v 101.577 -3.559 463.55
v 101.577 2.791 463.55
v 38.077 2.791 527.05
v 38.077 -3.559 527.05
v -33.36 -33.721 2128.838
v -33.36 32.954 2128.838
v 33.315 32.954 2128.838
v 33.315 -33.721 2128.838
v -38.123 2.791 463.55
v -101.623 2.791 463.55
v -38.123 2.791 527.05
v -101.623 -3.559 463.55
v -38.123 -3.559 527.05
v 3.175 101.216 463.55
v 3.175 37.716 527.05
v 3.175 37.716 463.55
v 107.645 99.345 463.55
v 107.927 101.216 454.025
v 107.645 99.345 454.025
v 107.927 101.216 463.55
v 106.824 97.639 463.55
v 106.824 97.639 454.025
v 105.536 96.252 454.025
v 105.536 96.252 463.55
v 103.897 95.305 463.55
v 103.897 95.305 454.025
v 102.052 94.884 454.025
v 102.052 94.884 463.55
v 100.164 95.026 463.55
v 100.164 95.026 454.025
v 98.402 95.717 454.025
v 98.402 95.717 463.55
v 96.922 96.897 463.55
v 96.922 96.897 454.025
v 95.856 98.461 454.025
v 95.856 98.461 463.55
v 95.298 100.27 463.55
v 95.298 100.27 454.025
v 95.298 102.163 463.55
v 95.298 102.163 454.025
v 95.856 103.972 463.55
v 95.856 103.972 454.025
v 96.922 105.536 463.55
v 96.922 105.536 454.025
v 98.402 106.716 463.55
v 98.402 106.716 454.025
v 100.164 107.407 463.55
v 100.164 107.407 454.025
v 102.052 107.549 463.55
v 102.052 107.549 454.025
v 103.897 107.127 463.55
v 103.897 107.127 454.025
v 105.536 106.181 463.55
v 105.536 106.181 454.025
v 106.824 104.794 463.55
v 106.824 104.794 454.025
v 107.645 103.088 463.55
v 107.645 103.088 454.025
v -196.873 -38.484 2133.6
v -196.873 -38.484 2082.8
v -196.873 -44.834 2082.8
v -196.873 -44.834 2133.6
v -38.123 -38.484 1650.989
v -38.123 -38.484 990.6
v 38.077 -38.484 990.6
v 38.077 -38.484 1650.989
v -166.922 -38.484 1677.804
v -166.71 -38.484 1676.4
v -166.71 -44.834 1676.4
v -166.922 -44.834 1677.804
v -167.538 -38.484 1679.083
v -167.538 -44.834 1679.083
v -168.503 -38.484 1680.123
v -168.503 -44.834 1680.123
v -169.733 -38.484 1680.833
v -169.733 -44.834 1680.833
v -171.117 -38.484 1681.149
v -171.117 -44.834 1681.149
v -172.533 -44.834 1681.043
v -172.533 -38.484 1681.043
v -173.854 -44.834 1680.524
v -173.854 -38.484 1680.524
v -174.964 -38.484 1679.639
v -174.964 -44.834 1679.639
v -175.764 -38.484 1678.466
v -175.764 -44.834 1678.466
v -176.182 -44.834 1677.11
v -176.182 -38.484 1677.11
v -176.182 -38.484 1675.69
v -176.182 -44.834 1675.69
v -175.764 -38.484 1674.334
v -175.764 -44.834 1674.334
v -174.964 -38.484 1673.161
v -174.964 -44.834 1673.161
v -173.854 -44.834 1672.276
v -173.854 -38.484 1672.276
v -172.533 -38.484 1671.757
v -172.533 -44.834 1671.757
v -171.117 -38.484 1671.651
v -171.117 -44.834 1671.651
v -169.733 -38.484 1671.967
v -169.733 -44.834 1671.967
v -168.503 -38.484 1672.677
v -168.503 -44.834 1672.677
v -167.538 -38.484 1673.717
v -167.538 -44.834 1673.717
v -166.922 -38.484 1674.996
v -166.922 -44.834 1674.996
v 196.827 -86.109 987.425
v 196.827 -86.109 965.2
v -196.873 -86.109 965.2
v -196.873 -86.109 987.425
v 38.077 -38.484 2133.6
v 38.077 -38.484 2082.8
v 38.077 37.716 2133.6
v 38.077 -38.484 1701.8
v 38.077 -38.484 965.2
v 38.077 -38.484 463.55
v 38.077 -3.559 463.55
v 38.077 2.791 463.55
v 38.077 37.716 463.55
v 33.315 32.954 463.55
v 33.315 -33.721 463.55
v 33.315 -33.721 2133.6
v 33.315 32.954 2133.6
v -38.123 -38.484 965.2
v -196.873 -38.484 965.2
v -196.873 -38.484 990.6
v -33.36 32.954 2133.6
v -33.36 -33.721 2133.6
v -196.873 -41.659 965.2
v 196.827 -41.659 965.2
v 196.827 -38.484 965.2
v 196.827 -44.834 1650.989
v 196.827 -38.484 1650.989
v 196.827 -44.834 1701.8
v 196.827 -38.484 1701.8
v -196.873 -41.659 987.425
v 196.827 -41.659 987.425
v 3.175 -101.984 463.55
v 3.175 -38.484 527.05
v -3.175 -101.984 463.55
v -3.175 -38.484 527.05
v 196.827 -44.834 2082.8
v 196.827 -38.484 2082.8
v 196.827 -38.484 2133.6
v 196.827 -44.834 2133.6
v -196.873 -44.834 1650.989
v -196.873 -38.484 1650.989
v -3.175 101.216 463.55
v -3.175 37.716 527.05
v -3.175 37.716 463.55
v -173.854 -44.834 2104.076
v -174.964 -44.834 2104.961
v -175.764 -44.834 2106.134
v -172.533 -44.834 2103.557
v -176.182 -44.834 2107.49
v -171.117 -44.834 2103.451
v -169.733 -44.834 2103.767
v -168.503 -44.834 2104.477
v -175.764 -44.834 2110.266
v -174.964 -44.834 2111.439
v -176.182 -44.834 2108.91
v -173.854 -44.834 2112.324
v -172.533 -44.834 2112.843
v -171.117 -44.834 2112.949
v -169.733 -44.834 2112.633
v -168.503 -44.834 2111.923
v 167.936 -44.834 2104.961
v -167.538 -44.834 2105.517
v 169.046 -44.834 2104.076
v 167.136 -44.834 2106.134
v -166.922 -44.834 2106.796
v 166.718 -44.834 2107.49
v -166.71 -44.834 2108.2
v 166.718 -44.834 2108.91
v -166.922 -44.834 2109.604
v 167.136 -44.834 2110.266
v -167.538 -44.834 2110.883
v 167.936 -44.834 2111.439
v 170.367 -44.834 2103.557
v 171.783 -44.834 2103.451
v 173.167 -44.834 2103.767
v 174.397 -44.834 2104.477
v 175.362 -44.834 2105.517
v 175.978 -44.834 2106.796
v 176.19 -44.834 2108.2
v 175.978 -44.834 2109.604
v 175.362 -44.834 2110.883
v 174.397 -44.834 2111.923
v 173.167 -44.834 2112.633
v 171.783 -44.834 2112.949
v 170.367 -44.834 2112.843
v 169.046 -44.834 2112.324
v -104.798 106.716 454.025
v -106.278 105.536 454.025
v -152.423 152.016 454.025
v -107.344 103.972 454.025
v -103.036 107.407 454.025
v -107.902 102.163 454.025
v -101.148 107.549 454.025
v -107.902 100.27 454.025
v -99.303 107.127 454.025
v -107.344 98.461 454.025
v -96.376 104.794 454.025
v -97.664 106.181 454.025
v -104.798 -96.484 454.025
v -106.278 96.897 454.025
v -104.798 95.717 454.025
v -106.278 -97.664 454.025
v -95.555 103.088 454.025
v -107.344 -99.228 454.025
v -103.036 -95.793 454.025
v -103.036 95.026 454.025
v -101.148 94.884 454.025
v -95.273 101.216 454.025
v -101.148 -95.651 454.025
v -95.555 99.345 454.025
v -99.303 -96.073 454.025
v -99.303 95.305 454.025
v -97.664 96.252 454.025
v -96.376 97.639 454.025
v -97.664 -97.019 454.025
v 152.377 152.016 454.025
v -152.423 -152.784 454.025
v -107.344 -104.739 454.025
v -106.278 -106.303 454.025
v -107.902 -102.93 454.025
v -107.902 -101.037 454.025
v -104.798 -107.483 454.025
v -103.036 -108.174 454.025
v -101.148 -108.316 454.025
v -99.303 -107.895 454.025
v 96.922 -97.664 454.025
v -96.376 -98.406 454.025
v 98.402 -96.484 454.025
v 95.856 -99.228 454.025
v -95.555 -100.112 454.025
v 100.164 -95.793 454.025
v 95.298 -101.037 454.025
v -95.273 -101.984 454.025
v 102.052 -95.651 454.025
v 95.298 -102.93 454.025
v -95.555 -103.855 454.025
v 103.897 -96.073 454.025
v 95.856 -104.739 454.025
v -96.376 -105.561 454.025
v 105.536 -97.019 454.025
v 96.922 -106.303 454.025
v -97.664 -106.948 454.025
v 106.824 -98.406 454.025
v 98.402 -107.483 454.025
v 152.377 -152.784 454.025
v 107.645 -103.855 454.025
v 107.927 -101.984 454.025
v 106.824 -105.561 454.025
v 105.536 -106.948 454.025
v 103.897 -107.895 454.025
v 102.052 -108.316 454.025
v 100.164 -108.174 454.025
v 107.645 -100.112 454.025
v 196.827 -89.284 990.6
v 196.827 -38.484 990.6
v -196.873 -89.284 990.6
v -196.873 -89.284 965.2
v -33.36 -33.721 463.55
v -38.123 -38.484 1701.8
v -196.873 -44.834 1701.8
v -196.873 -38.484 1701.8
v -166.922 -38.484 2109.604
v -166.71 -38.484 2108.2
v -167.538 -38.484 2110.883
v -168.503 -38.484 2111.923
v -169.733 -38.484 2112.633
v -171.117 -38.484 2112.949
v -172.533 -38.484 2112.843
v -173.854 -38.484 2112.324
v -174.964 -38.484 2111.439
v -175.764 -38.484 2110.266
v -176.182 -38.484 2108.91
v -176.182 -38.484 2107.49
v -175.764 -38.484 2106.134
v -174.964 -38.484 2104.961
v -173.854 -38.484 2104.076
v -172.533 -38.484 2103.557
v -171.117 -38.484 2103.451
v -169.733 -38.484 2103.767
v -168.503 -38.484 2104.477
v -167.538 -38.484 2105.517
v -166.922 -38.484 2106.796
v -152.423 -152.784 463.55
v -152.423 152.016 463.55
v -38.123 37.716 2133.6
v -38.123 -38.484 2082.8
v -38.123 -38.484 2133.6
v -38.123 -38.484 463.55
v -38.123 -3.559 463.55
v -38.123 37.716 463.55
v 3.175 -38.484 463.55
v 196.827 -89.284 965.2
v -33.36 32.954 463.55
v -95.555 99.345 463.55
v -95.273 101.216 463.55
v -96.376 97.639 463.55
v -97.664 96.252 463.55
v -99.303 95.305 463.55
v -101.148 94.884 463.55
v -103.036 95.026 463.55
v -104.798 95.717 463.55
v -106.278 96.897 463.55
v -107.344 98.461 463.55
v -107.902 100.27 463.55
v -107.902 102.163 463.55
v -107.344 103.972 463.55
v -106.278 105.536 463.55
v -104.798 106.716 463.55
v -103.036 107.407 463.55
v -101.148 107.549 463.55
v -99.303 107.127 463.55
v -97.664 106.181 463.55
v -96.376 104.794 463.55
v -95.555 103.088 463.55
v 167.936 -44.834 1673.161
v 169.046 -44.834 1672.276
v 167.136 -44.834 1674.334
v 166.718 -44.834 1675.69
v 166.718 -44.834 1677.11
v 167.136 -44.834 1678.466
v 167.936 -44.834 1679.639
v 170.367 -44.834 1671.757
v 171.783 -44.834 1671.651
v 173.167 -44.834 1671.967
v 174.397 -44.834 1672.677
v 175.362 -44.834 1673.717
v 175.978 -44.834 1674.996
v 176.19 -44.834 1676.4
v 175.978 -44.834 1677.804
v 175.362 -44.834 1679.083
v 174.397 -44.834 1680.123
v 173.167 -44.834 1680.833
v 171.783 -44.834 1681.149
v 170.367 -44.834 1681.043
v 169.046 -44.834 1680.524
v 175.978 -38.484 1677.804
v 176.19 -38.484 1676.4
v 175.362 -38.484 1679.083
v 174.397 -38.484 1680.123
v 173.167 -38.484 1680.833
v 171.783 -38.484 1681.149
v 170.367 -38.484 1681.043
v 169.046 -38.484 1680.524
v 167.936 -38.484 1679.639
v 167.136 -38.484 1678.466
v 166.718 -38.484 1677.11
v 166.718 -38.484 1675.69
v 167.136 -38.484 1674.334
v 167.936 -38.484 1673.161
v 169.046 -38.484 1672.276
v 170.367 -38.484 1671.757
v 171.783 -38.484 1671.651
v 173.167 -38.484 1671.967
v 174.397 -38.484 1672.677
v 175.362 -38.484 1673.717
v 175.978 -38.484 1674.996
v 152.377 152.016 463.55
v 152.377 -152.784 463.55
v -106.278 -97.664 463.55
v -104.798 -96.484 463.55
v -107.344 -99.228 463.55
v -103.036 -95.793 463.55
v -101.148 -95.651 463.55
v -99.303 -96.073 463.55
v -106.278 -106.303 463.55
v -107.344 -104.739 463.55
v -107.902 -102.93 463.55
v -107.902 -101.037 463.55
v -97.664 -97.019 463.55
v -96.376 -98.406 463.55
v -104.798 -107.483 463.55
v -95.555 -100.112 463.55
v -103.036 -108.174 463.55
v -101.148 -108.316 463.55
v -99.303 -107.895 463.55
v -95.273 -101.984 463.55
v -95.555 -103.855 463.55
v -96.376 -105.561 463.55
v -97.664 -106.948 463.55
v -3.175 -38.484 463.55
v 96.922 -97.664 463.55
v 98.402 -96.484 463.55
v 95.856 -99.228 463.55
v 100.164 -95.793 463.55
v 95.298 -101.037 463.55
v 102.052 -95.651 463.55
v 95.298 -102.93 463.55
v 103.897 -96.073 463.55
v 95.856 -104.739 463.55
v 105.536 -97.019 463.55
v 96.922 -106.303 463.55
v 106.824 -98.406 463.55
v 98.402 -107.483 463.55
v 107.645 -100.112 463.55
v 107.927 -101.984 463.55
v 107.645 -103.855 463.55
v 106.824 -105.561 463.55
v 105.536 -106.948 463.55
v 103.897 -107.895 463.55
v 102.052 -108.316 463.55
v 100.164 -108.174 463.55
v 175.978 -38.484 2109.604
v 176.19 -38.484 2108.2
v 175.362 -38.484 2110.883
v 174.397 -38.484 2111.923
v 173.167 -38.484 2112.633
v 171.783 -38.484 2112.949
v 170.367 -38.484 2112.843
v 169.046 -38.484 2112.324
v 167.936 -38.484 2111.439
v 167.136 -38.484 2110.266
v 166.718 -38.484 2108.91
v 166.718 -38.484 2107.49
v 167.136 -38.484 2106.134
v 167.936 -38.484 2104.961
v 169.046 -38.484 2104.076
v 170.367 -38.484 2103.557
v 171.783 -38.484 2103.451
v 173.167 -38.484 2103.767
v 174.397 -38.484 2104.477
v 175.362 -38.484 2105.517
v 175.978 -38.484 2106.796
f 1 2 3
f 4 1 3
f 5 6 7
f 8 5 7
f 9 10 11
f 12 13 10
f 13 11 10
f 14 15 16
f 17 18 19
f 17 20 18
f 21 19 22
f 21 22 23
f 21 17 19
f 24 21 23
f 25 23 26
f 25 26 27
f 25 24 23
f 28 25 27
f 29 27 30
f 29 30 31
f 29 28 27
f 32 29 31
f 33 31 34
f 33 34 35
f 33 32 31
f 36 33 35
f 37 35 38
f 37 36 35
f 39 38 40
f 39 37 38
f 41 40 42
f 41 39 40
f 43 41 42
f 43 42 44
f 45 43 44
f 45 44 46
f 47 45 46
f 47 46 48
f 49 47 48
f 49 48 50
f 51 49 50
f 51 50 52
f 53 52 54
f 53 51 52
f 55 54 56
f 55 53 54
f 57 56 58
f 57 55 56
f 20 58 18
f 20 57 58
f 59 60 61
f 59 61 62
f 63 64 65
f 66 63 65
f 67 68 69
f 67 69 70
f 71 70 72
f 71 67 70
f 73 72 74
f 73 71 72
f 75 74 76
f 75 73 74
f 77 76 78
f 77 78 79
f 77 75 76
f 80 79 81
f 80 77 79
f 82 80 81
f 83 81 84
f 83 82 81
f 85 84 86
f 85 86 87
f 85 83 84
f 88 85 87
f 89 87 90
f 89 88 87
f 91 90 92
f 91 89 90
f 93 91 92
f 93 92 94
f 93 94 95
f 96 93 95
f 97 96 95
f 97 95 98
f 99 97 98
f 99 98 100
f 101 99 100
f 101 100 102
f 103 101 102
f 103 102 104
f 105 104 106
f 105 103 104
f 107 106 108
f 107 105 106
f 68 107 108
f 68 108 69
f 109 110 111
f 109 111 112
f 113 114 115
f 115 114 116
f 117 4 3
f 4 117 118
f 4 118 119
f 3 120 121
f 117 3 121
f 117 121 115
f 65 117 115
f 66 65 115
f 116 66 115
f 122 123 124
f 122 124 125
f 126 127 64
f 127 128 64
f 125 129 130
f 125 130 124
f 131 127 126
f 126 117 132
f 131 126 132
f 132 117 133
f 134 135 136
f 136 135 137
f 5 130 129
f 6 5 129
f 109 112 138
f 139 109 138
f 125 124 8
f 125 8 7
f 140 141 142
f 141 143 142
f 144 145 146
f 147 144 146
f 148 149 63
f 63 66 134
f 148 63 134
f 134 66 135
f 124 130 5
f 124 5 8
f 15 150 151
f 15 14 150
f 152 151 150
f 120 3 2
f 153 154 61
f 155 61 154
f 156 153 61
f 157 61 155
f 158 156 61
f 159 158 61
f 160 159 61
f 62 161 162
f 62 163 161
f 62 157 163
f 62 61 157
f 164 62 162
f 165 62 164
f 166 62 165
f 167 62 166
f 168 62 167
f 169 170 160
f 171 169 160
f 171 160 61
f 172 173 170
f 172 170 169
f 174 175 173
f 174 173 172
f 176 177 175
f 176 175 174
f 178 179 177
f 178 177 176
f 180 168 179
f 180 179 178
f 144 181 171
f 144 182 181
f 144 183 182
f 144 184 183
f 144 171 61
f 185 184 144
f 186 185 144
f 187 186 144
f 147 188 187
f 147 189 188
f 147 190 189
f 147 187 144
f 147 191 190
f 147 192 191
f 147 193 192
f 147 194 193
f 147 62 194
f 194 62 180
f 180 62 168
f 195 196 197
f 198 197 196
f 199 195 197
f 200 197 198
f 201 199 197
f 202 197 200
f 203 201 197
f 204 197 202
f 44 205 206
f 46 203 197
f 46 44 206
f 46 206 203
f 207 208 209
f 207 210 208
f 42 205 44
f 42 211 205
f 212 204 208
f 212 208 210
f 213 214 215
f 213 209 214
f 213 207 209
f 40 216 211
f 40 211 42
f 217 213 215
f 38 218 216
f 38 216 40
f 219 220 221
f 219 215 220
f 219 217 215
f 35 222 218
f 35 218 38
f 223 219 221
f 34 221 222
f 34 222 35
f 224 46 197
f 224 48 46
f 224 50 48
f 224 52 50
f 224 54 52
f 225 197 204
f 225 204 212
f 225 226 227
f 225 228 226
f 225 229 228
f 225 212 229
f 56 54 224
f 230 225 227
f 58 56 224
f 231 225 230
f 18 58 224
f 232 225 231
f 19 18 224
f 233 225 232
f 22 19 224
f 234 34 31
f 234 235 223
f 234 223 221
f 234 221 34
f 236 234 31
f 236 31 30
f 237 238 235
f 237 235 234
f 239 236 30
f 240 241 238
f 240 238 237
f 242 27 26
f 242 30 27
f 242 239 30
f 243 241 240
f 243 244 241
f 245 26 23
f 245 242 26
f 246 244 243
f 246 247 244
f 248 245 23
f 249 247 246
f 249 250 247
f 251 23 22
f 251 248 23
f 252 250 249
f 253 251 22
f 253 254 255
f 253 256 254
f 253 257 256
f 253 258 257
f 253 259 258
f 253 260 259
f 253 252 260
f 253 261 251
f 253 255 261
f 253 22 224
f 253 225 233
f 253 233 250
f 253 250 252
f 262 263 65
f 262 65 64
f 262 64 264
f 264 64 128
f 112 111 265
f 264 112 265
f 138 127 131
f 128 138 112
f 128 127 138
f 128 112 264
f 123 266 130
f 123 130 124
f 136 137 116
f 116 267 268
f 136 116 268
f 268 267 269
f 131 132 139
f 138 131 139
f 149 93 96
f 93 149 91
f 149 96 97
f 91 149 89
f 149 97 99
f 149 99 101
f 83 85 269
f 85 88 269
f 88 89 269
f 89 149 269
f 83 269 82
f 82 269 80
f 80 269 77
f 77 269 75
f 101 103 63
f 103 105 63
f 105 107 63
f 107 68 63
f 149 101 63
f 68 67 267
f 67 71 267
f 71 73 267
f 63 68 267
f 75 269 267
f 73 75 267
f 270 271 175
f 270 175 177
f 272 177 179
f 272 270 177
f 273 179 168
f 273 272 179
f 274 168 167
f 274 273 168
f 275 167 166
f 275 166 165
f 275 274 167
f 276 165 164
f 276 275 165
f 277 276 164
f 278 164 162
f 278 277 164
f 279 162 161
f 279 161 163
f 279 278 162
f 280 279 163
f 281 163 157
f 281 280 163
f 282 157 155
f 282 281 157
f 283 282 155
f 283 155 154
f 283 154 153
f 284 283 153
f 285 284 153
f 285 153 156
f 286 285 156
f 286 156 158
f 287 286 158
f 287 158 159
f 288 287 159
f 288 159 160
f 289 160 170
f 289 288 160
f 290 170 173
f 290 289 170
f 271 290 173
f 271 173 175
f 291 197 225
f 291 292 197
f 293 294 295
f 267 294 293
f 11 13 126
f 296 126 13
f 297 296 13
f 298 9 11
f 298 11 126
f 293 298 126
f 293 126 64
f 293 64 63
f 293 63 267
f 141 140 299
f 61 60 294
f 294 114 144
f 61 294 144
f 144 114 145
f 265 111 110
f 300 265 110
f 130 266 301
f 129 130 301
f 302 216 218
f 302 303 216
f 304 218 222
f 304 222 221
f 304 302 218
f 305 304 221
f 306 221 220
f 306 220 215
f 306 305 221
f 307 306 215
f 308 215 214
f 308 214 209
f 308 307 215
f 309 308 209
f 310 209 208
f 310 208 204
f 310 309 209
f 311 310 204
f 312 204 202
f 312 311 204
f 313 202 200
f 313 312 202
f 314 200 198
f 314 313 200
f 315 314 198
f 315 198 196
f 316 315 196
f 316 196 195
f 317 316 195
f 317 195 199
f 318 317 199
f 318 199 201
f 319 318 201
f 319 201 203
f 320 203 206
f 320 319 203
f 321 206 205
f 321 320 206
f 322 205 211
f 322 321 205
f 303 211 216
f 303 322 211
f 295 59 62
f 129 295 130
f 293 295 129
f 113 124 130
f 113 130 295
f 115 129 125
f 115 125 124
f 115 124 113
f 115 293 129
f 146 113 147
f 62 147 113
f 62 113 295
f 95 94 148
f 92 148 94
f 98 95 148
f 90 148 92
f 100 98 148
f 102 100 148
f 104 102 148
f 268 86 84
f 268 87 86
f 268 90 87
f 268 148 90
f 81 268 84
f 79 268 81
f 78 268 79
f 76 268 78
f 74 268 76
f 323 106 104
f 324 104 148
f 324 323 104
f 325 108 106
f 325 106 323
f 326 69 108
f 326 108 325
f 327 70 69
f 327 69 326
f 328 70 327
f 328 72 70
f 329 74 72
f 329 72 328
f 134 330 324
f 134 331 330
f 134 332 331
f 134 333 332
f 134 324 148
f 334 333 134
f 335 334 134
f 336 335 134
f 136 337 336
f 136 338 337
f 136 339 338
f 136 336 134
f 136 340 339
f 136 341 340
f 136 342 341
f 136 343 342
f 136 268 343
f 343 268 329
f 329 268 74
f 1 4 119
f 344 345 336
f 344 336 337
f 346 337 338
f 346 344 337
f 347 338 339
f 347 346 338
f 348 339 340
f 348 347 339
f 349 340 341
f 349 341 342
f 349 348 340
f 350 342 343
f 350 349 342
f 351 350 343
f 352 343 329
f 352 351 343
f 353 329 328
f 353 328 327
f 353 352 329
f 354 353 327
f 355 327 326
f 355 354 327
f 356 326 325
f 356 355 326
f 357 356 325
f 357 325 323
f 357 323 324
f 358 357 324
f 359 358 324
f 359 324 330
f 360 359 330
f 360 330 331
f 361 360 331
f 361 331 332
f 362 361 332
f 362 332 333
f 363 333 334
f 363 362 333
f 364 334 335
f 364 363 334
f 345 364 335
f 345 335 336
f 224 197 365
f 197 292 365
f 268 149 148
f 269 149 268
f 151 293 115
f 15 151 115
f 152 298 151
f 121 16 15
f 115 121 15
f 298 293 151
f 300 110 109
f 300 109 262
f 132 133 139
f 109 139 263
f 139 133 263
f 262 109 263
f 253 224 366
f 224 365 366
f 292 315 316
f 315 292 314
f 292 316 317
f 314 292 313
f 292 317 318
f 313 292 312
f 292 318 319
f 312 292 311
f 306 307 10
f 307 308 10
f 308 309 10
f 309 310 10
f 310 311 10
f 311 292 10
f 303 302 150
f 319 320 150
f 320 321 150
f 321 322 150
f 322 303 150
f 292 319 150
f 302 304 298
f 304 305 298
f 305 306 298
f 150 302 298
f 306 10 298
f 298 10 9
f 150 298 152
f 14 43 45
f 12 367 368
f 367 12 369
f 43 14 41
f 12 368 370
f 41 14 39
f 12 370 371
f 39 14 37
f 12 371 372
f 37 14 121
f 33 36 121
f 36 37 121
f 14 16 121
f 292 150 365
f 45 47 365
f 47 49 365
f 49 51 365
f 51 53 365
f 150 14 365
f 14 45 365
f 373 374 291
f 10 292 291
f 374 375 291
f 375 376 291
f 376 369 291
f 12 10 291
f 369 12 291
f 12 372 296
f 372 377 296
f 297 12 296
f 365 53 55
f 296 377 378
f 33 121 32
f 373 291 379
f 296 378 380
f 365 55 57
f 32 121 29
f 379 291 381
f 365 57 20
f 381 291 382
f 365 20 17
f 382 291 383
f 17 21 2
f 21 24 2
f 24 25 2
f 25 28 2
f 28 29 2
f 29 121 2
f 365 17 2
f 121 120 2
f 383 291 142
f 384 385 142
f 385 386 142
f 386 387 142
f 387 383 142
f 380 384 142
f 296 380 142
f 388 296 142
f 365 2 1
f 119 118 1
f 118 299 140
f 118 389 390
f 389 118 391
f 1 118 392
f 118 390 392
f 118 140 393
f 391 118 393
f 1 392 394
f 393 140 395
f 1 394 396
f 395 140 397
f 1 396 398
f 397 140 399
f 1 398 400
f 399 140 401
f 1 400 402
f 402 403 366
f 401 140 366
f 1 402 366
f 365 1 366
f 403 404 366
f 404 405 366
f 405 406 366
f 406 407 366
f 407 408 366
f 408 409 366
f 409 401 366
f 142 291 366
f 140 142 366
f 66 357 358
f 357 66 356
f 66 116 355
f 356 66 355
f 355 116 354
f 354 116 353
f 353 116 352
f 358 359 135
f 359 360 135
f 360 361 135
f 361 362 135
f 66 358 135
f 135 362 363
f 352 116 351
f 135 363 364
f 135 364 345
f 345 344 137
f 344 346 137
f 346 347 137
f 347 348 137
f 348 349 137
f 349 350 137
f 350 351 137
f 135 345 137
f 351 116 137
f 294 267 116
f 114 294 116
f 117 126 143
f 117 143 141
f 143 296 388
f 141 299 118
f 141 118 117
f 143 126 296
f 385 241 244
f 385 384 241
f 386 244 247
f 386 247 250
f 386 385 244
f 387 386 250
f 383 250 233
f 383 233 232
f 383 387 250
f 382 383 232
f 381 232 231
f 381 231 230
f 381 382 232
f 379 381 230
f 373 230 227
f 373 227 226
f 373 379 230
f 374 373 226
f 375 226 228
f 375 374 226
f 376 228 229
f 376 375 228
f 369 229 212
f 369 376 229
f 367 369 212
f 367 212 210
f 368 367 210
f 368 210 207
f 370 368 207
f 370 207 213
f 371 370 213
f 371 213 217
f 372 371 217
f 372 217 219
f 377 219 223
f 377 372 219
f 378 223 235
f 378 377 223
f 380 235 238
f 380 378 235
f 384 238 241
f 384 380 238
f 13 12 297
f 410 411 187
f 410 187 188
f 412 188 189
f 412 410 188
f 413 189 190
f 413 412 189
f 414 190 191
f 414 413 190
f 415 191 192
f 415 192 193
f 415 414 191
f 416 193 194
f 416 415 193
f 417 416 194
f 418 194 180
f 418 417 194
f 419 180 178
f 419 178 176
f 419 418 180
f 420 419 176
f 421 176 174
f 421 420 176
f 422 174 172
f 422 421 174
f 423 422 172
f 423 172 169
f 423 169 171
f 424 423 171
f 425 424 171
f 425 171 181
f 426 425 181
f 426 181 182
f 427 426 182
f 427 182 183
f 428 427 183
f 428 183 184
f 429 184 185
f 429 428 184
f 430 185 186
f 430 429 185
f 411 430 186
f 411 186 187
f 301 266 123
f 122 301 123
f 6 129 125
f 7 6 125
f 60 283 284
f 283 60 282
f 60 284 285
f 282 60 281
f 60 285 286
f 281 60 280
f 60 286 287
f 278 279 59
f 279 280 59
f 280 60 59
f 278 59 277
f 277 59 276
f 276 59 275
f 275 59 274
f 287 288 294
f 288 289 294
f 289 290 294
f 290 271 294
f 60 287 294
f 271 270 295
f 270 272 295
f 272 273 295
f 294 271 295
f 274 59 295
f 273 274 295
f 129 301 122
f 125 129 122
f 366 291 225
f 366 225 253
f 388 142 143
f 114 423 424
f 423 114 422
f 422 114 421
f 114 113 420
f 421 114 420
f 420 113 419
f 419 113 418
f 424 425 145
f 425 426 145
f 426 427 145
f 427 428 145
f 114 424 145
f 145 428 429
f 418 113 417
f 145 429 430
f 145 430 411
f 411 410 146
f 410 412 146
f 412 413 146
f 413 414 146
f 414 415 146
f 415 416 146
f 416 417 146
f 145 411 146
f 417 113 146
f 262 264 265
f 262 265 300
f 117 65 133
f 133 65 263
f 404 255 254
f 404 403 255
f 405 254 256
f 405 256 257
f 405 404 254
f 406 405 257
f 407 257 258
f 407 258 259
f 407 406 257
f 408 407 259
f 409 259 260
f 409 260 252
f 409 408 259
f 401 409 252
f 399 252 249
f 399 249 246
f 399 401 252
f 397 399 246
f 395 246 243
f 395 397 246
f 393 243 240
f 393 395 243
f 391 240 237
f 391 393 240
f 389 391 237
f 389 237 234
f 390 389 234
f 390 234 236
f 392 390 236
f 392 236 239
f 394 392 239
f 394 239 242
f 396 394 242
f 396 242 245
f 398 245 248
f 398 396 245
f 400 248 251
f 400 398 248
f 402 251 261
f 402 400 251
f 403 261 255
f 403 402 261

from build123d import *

# Parameters (mm, degrees)
F0_W      = 76.2
F0_H      = 76.2
F0_W_2    = 66.675
F0_H_2    = 66.675
F1_DEPTH  = 2133.6
F2_W      = 66.675
F2_H      = 66.675
F4_DEPTH  = 4.7625
F6_DEPTH  = 457.2
F8_W      = 304.8
F8_H      = 304.8
F8_R      = 6.35
F9_DEPTH  = 6.35
F12_DEPTH = 3.175
F13_DEPTH = 3.175
F15_DEPTH = 3.175
F16_DEPTH = 3.175
F17_DEPTH = 3.175
F5_W      = 158.75
F5_H      = 50.8105754852
F5_R      = 4.7625
F5_W_2    = 76.2
F5_H_2    = 50.8
F18_DEPTH = 6.35
F19_W     = 158.75
F19_H     = 25.4
F19_W_2   = 76.2
F20_DEPTH = 50.8
F21_W     = 44.45
F21_H     = 22.225
F22_DEPTH = 508


# Not quite as in the source:
# - a feature names something its author has since deleted; it is built from what else it names


with BuildPart() as f1:
    # F0 (on Top) → F1 (new body)
    with BuildSketch(Plane.XY):
        with Locations((-0.0228539575, -0.3835560492)):
            Rectangle(F0_W, F0_H)
        with Locations((-0.0228539575, -0.3835560492)):
            Rectangle(F0_W_2, F0_H_2, mode=Mode.SUBTRACT)
    extrude(amount=F1_DEPTH)

    # F6 (cut): a face of the model
    f6_faces = [f1.faces().sort_by_distance(p)[0] for p in [
        (-0.0228539575, 36.6388132163, 0),
    ]]
    extrude(f6_faces, amount=-F6_DEPTH, mode=Mode.SUBTRACT)

    # F8 (on offset) → F9 (join)
    with BuildSketch(Plane(origin=(0, 0, 457.2), x_dir=(1, 0, 0), z_dir=(0, 0, -1))):
        with Locations((-0.0228539575, 0.3835560492)):
            Rectangle(F8_W, F8_H)
        with Locations((-101.6228539575, -101.2164439508)):
            Circle(F8_R, mode=Mode.SUBTRACT)
        with Locations((101.5771460425, -101.2164439508)):
            Circle(F8_R, mode=Mode.SUBTRACT)
        with Locations((-101.6228539575, 101.9835560492)):
            Circle(F8_R, mode=Mode.SUBTRACT)
        with Locations((101.5771460425, 101.9835560492)):
            Circle(F8_R, mode=Mode.SUBTRACT)
    extrude(amount=-F9_DEPTH)

    # F8 (on offset) → F12 (join)
    with BuildSketch(Plane(origin=(0, 0, 457.2), x_dir=(1, 0, 0), z_dir=(0, 0, -1))):
        with Locations((-0.0228539575, 0.3835560492)):
            Rectangle(F8_W, F8_H)
        with Locations((-101.6228539575, -101.2164439508)):
            Circle(F8_R, mode=Mode.SUBTRACT)
        with Locations((101.5771460425, -101.2164439508)):
            Circle(F8_R, mode=Mode.SUBTRACT)
        with Locations((-101.6228539575, 101.9835560492)):
            Circle(F8_R, mode=Mode.SUBTRACT)
        with Locations((101.5771460425, 101.9835560492)):
            Circle(F8_R, mode=Mode.SUBTRACT)
    extrude(amount=F12_DEPTH)

    # F11 (on offset) → F13 (join)
    with BuildSketch(Plane.XZ.offset(0.3835560492)):
        Polygon((101.5771460425, 463.55), (38.0771460425, 527.05), (38.0771460425, 463.55), align=None)
        Polygon((-38.1228539575, 463.55), (-38.1228539575, 527.05), (-101.6228539575, 463.55), align=None)
    extrude(amount=-F13_DEPTH)

    # F14 (on Right) → F15 (join)
    with BuildSketch(Plane.YZ):
        Polygon((101.2164439508, 463.55), (37.7164439508, 527.05), (37.7164439508, 463.55), align=None)
        Polygon((-38.4835560492, 463.55), (-38.4835560492, 527.05), (-101.9835560492, 463.55), align=None)
    extrude(amount=F15_DEPTH)

    # F14 (on Right) → F16 (join)
    with BuildSketch(Plane.YZ):
        Polygon((101.2164439508, 463.55), (37.7164439508, 527.05), (37.7164439508, 463.55), align=None)
        Polygon((-38.4835560492, 463.55), (-38.4835560492, 527.05), (-101.9835560492, 463.55), align=None)
    extrude(amount=-F16_DEPTH)

    # F11 (on offset) + F13_face (on face) → F17 (join)
    with BuildSketch(Plane.XZ.offset(0.3835560492)):
        Polygon((101.5771460425, 463.55), (38.0771460425, 527.05), (38.0771460425, 463.55), align=None)
        Polygon((-38.1228539575, 463.55), (-38.1228539575, 527.05), (-101.6228539575, 463.55), align=None)
    with BuildSketch(Plane(origin=(59.2438127092, -0.3835560492, 484.7166666667), x_dir=(1, 0, 0), z_dir=(0, -1, 0))):
        Polygon((42.3333333333, -21.1666666667), (-21.1666666667, 42.3333333333), (-21.1666666667, -21.1666666667), align=None)
    extrude(amount=F17_DEPTH)

    # F5 (on face) → F18 (join)
    with BuildSketch(Plane.XZ.offset(38.4835560492)):
        with Locations((-117.4978539575, 1676.3947122574)):
            Rectangle(F5_W, F5_H)
        with Locations((-171.4728539575, 1676.4)):
            Circle(F5_R, mode=Mode.SUBTRACT)
        with Locations((117.4521460425, 1676.3947122574)):
            Rectangle(F5_W, F5_H)
        with Locations((171.4271460425, 1676.4)):
            Circle(F5_R, mode=Mode.SUBTRACT)
        with Locations((-0.0228539575, 1676.3947122574)):
            Rectangle(F5_W_2, F5_H)
        with Locations((-117.4978539575, 2108.2)):
            Rectangle(F5_W, F5_H_2)
        with Locations((-171.4728539575, 2108.2)):
            Circle(F5_R, mode=Mode.SUBTRACT)
        with Locations((-0.0228539575, 2108.2)):
            Rectangle(F5_W_2, F5_H_2)
        with Locations((117.4521460425, 2108.2)):
            Rectangle(F5_W, F5_H_2)
        with Locations((171.4271460425, 2108.2)):
            Circle(F5_R, mode=Mode.SUBTRACT)
    extrude(amount=F18_DEPTH)

    # F19 (on face) → F20 (join)
    with BuildSketch(Plane.XZ.offset(38.4835560492)):
        with Locations((117.4521460425, 977.9)):
            Rectangle(F19_W, F19_H)
        with Locations((-0.0228539575, 977.9)):
            Rectangle(F19_W_2, F19_H)
        with Locations((-117.4978539575, 977.9)):
            Rectangle(F19_W, F19_H)
    extrude(amount=F20_DEPTH)

    # F21 (on face) → F22 (cut)
    with BuildSketch(Plane.YZ.offset(196.8271460425)):
        with Locations((-63.8835560492, 976.3125)):
            Rectangle(F21_W, F21_H)
    extrude(amount=-F22_DEPTH, mode=Mode.SUBTRACT)


with BuildPart() as f4:
    # F2 (on face) → F4 (new body)
    with BuildSketch(Plane.XY.offset(2133.6)):
        with Locations((-0.0228539575, -0.3835560492)):
            Rectangle(F2_W, F2_H)
    extrude(amount=-F4_DEPTH)


solid = Compound([f1.part, f4.part])
